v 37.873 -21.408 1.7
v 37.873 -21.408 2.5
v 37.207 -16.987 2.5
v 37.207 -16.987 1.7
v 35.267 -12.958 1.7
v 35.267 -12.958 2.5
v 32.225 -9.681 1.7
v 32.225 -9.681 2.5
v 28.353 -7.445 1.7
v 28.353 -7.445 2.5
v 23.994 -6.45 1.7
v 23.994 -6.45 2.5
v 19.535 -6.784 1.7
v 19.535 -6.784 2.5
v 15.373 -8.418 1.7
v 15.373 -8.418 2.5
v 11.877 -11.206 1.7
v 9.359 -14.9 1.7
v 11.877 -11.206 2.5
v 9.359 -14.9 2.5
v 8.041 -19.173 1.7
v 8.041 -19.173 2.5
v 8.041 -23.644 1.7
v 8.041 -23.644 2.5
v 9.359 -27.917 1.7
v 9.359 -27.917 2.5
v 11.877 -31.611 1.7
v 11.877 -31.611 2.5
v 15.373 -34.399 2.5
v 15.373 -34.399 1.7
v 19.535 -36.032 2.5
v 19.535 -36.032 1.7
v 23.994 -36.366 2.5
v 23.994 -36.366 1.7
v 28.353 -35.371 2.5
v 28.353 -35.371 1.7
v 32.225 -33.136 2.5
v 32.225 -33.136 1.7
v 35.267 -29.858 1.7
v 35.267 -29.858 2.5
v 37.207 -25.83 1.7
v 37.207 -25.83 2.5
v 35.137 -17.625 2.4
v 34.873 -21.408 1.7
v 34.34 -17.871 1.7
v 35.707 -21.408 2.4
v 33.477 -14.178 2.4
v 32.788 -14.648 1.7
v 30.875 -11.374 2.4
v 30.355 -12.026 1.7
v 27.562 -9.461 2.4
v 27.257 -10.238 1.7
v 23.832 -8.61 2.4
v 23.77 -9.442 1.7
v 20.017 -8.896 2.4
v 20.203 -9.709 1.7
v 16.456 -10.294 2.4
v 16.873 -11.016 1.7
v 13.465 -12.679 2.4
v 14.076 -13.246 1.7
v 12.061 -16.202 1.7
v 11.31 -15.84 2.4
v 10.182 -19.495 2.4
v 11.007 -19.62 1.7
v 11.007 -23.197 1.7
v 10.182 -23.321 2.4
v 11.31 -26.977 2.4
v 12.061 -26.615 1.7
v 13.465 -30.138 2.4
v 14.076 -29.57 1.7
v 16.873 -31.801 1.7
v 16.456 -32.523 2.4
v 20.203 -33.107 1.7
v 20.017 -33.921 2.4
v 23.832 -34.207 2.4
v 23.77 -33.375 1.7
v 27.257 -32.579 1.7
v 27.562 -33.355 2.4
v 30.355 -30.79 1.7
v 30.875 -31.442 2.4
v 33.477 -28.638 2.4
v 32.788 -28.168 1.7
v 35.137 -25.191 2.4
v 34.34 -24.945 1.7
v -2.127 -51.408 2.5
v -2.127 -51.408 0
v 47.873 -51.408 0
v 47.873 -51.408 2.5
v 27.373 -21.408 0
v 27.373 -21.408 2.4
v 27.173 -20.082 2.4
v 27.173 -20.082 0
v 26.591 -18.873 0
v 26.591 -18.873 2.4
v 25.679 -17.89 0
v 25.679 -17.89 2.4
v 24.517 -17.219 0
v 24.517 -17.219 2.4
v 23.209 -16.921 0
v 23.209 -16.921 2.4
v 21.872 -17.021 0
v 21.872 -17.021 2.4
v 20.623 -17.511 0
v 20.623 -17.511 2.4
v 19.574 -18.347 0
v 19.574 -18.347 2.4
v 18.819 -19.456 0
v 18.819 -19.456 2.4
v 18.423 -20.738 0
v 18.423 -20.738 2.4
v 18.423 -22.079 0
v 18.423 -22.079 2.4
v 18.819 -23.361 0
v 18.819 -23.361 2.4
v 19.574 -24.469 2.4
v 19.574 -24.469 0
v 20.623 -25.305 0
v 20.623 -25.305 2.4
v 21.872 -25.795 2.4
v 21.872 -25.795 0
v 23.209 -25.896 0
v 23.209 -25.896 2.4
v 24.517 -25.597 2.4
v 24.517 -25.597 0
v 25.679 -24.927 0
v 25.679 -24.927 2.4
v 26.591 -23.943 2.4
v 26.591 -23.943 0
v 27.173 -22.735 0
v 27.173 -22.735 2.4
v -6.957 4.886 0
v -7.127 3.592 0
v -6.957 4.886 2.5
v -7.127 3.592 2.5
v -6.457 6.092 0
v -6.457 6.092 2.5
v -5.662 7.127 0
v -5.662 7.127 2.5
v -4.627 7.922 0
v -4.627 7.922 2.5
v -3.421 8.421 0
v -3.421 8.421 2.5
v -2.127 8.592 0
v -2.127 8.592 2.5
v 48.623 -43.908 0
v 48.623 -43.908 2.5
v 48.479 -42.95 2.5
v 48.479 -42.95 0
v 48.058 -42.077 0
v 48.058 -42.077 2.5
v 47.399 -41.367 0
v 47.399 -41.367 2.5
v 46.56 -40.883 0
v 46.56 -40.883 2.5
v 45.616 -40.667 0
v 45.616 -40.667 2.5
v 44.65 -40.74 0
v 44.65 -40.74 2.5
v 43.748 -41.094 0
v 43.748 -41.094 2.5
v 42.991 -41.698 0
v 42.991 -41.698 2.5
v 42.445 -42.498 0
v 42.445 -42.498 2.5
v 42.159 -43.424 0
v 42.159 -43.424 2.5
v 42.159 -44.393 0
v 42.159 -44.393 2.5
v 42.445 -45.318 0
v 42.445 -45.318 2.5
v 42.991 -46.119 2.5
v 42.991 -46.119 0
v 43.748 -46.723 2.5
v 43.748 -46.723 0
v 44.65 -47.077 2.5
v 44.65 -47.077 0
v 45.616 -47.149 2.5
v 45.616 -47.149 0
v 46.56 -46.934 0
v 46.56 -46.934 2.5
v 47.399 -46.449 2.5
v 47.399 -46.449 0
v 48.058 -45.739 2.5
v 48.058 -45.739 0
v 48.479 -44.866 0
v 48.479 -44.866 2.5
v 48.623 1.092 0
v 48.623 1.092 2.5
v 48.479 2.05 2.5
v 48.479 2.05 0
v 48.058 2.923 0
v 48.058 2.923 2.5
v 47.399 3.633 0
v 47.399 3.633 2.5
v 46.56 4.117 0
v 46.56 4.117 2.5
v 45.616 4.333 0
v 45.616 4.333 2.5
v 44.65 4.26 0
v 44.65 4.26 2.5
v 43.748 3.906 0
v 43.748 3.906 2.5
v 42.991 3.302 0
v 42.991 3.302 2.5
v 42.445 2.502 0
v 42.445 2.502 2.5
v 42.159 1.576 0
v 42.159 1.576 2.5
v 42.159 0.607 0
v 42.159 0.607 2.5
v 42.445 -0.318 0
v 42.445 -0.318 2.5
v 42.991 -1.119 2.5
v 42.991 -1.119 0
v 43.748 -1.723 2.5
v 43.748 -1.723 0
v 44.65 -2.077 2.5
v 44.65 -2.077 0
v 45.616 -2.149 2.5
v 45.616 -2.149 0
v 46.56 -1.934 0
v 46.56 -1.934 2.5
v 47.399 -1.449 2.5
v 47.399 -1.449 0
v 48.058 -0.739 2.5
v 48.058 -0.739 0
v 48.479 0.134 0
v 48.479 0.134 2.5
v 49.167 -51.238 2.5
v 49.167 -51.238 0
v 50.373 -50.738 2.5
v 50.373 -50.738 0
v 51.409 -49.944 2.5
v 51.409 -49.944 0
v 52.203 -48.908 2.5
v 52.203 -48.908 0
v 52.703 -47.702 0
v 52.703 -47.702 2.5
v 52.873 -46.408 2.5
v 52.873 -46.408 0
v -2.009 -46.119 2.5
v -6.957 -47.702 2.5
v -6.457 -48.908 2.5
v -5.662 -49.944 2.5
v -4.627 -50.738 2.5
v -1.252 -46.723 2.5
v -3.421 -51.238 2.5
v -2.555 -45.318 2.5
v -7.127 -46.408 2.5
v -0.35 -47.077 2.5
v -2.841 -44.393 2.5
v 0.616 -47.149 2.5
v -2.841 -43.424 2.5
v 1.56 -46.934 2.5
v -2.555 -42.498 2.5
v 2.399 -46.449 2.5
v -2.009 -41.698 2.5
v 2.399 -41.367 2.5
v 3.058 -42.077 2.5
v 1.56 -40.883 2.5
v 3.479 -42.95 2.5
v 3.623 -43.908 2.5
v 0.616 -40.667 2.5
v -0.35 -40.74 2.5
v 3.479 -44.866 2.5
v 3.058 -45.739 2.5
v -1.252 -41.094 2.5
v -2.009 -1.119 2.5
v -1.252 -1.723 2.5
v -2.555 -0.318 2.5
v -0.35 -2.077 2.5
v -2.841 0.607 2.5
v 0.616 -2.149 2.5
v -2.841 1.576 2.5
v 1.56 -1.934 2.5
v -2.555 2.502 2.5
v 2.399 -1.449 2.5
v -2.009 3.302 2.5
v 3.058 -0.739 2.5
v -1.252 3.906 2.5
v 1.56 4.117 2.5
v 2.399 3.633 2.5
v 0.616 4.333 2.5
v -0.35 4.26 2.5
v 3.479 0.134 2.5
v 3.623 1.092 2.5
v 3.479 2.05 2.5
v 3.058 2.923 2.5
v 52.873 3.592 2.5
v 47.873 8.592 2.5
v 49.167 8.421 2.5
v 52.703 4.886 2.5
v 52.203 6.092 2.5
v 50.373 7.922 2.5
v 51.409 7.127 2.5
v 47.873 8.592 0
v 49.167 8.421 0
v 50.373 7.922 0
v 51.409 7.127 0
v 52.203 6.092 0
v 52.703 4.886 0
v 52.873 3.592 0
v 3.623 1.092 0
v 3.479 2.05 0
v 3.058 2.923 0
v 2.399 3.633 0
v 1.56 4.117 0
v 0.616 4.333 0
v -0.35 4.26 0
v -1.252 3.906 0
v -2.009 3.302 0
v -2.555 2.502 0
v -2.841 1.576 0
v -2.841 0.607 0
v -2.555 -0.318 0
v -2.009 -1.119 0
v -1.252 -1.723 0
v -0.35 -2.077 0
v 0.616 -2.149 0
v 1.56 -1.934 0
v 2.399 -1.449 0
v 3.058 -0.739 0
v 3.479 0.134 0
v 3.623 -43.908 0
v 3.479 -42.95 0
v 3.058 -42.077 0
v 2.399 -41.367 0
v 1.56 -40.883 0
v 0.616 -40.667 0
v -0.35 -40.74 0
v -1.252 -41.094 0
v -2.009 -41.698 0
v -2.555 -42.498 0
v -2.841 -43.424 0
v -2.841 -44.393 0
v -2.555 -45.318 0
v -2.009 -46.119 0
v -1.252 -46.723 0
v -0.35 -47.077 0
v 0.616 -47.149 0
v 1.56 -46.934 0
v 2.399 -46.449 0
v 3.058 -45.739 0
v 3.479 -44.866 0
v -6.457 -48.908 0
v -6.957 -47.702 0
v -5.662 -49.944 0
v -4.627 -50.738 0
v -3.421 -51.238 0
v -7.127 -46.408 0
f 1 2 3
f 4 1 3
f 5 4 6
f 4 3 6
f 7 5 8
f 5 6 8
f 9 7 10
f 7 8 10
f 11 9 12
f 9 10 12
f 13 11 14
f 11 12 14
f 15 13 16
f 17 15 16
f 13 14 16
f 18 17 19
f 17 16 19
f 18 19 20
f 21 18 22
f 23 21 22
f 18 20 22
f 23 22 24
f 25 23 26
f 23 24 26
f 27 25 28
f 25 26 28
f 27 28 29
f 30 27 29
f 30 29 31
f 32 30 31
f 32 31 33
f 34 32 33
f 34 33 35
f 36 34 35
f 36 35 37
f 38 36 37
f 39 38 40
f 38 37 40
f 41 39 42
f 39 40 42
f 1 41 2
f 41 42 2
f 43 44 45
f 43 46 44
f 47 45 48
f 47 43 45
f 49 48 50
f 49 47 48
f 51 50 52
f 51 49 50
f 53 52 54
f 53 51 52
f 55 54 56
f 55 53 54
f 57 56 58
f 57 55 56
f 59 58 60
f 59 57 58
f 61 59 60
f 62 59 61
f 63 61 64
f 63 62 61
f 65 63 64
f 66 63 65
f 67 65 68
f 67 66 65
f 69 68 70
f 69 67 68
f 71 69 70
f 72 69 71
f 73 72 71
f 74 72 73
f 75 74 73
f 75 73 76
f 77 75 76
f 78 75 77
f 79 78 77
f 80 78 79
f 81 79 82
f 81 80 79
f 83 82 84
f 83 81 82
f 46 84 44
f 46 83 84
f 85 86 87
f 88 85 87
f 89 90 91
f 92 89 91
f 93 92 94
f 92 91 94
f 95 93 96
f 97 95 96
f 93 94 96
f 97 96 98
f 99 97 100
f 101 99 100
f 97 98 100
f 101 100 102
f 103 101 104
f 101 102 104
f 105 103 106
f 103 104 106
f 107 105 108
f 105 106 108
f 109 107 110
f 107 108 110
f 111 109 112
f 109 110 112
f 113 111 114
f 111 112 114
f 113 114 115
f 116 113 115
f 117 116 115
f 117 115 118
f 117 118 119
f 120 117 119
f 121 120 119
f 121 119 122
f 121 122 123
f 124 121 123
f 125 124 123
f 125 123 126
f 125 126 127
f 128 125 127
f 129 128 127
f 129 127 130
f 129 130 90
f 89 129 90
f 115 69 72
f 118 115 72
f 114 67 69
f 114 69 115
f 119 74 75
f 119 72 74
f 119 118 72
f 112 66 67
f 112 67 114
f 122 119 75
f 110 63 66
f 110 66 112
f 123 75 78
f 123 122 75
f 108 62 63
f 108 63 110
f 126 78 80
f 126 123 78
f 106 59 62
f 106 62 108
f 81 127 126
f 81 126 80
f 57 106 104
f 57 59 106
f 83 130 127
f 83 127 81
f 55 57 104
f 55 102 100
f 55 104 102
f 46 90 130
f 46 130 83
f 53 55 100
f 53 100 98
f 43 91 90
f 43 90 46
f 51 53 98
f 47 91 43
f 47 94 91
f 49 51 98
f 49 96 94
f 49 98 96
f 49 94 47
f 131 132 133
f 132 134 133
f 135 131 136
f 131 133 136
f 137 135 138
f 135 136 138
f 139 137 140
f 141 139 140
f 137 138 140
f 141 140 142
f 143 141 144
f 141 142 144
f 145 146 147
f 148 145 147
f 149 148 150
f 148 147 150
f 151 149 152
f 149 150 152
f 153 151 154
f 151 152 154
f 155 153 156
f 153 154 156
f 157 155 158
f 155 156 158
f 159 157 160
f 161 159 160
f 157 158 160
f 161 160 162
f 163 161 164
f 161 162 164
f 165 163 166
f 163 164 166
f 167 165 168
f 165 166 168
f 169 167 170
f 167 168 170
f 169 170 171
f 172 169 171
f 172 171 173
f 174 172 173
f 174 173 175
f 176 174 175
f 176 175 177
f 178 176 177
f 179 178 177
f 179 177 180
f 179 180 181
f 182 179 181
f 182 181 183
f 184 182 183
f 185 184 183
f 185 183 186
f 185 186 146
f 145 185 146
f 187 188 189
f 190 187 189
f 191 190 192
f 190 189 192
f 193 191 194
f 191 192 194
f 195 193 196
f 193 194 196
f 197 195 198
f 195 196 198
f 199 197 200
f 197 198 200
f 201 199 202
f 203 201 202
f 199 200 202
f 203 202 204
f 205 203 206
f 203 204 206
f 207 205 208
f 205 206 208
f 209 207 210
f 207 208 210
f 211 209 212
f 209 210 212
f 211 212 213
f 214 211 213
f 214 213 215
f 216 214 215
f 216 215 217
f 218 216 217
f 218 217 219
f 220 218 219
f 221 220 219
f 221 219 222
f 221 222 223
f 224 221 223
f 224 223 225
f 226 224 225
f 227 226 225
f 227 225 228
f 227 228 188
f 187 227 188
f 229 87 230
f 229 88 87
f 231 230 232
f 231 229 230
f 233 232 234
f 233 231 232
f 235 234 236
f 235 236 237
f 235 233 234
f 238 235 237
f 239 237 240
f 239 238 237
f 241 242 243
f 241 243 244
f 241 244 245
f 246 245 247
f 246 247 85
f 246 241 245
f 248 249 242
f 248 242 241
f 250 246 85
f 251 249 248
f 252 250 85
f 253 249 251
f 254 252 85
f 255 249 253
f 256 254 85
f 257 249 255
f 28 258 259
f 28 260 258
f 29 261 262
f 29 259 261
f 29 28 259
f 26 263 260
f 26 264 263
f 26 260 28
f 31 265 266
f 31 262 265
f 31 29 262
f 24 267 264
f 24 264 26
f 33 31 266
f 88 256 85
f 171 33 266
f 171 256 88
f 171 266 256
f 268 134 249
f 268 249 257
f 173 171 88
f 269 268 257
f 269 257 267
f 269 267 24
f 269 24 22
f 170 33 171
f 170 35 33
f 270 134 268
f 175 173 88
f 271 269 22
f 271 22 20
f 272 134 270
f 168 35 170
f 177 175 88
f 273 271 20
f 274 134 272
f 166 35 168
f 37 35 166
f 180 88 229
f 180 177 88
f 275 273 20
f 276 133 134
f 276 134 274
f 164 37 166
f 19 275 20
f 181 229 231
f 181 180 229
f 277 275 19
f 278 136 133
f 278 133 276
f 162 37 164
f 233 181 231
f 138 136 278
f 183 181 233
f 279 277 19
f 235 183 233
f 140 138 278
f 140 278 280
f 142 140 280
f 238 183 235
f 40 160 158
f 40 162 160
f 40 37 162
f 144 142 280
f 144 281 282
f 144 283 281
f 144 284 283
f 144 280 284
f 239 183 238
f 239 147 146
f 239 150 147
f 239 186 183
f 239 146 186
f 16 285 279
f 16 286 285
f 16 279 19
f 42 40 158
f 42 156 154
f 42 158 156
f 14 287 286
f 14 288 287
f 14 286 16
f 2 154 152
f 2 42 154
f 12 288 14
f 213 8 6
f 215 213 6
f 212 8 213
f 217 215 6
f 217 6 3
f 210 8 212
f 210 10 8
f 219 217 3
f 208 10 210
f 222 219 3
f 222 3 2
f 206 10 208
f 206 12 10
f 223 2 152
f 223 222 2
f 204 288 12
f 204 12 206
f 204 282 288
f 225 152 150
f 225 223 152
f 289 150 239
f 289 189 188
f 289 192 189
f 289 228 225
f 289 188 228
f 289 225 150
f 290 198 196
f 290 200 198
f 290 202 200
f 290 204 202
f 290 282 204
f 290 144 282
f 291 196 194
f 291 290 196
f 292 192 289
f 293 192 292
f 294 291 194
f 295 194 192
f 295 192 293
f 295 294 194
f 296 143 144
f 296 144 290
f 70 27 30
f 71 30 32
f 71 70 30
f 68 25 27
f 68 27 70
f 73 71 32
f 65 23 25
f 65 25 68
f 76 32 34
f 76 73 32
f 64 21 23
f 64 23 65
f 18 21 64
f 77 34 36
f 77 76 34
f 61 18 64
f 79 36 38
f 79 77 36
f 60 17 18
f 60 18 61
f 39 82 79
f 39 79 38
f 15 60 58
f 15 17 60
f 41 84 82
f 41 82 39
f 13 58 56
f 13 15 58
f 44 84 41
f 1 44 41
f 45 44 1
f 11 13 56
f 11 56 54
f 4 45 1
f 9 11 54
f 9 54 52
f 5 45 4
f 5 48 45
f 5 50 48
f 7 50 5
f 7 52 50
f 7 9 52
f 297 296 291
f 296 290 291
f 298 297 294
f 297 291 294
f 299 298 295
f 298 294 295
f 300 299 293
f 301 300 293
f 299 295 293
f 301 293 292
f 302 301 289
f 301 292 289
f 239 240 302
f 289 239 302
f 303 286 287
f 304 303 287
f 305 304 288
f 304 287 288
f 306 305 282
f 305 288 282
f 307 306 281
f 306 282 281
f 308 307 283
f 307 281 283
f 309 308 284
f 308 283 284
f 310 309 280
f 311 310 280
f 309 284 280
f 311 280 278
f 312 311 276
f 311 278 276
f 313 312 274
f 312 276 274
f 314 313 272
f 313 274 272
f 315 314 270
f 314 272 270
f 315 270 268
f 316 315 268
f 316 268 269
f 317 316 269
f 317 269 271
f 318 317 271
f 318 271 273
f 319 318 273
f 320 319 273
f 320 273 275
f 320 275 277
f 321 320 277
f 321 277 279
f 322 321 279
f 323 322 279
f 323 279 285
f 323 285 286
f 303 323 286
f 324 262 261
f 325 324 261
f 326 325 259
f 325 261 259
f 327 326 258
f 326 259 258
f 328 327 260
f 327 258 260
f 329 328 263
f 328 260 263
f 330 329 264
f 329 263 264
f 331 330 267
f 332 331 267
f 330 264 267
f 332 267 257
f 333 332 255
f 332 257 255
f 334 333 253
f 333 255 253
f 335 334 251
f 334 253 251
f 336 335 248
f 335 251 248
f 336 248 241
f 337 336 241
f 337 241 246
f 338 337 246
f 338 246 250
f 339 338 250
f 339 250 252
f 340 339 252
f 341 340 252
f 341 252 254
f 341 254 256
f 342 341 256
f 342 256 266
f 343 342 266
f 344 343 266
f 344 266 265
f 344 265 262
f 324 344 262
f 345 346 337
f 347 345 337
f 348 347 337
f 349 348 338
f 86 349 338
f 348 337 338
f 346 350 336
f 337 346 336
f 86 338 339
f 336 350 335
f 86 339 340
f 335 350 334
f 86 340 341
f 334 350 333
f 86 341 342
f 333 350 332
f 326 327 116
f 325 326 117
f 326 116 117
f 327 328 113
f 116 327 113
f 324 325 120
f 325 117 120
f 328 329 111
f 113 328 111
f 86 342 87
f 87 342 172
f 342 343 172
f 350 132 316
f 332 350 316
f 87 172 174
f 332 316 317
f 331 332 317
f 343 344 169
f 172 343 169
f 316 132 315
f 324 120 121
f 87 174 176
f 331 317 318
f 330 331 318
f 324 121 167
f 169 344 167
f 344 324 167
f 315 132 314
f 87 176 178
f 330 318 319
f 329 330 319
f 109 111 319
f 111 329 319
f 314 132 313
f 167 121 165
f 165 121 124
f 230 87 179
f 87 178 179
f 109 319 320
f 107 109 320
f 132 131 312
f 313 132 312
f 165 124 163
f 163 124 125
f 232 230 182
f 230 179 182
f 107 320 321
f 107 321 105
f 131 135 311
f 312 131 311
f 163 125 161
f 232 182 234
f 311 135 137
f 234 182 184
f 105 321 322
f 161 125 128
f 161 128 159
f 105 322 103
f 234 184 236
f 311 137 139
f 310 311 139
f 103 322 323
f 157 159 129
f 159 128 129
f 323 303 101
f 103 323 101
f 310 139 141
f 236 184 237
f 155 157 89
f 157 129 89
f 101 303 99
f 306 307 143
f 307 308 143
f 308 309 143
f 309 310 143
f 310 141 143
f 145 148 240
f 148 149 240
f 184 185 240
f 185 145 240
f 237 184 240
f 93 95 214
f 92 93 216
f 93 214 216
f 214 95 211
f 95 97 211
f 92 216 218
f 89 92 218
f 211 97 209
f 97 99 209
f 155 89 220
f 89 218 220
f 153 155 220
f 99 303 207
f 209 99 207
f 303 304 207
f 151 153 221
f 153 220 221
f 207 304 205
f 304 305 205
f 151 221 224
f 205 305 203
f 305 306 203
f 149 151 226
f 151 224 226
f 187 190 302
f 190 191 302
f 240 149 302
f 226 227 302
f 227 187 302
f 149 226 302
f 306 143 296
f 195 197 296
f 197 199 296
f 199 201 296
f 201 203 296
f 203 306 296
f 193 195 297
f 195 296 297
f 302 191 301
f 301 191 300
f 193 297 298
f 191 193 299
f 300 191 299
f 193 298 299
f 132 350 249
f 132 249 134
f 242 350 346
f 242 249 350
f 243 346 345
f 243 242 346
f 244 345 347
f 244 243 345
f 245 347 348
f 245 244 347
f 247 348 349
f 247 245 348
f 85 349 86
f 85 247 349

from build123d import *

# Parameters (mm, degrees)
F0_W     = 60
F0_H     = 60
F1_DEPTH = 2.5
F2_R     = 3.25
F3_DEPTH = 25
F4_R     = 15
F5_DEPTH = 0.8
F6_R     = 12
F7_DEPTH = 0.7
F7_TAPER = -50
F8_R     = 4.5
F9_DEPTH = 25
F10_R    = 5


with BuildPart() as f1:
    # F0 (on Top) → F1 (new body)
    with BuildSketch(Plane.XY):
        with Locations((22.8730514646, -21.4082733154)):
            Rectangle(F0_W, F0_H)
    extrude(amount=F1_DEPTH)

    # F2 (on face) → F3 (cut)
    with BuildSketch(Plane.XY.offset(2.5)):
        with Locations((0.3730514646, 1.0917266846)):
            Circle(F2_R)
        with Locations((45.3730514646, 1.0917266846)):
            Circle(F2_R)
        with Locations((45.3730514646, -43.9082733154)):
            Circle(F2_R)
        with Locations((0.3730514646, -43.9082733154)):
            Circle(F2_R)
    extrude(amount=-F3_DEPTH, mode=Mode.SUBTRACT)

    # F4 (on face) → F5 (cut)
    with BuildSketch(Plane.XY.offset(2.5)):
        with Locations((22.8730514646, -21.4082733154)):
            Circle(F4_R)
    extrude(amount=-F5_DEPTH, mode=Mode.SUBTRACT)

    # F6 (on face) → F7 (join)
    with BuildSketch(Plane.XY.offset(1.7)):
        with Locations((22.8730514646, -21.4082733154)):
            Circle(F6_R)
    extrude(amount=F7_DEPTH, taper=F7_TAPER)

    # F8 (on face) → F9 (cut)
    with BuildSketch(Plane.XY.offset(2.4)):
        with Locations((22.8730514646, -21.4082733154)):
            Circle(F8_R)
    extrude(amount=-F9_DEPTH, mode=Mode.SUBTRACT)

    # F10
    f10_edges = [f1.edges().sort_by_distance(p)[0] for p in [
        (-7.126949, -51.408273, 1.25),
        (52.873051, -51.408273, 1.25),
        (52.873051, 8.591727, 1.25),
        (-7.126949, 8.591727, 1.25),
    ]]
    fillet(f10_edges, radius=F10_R)


solid = f1.part
